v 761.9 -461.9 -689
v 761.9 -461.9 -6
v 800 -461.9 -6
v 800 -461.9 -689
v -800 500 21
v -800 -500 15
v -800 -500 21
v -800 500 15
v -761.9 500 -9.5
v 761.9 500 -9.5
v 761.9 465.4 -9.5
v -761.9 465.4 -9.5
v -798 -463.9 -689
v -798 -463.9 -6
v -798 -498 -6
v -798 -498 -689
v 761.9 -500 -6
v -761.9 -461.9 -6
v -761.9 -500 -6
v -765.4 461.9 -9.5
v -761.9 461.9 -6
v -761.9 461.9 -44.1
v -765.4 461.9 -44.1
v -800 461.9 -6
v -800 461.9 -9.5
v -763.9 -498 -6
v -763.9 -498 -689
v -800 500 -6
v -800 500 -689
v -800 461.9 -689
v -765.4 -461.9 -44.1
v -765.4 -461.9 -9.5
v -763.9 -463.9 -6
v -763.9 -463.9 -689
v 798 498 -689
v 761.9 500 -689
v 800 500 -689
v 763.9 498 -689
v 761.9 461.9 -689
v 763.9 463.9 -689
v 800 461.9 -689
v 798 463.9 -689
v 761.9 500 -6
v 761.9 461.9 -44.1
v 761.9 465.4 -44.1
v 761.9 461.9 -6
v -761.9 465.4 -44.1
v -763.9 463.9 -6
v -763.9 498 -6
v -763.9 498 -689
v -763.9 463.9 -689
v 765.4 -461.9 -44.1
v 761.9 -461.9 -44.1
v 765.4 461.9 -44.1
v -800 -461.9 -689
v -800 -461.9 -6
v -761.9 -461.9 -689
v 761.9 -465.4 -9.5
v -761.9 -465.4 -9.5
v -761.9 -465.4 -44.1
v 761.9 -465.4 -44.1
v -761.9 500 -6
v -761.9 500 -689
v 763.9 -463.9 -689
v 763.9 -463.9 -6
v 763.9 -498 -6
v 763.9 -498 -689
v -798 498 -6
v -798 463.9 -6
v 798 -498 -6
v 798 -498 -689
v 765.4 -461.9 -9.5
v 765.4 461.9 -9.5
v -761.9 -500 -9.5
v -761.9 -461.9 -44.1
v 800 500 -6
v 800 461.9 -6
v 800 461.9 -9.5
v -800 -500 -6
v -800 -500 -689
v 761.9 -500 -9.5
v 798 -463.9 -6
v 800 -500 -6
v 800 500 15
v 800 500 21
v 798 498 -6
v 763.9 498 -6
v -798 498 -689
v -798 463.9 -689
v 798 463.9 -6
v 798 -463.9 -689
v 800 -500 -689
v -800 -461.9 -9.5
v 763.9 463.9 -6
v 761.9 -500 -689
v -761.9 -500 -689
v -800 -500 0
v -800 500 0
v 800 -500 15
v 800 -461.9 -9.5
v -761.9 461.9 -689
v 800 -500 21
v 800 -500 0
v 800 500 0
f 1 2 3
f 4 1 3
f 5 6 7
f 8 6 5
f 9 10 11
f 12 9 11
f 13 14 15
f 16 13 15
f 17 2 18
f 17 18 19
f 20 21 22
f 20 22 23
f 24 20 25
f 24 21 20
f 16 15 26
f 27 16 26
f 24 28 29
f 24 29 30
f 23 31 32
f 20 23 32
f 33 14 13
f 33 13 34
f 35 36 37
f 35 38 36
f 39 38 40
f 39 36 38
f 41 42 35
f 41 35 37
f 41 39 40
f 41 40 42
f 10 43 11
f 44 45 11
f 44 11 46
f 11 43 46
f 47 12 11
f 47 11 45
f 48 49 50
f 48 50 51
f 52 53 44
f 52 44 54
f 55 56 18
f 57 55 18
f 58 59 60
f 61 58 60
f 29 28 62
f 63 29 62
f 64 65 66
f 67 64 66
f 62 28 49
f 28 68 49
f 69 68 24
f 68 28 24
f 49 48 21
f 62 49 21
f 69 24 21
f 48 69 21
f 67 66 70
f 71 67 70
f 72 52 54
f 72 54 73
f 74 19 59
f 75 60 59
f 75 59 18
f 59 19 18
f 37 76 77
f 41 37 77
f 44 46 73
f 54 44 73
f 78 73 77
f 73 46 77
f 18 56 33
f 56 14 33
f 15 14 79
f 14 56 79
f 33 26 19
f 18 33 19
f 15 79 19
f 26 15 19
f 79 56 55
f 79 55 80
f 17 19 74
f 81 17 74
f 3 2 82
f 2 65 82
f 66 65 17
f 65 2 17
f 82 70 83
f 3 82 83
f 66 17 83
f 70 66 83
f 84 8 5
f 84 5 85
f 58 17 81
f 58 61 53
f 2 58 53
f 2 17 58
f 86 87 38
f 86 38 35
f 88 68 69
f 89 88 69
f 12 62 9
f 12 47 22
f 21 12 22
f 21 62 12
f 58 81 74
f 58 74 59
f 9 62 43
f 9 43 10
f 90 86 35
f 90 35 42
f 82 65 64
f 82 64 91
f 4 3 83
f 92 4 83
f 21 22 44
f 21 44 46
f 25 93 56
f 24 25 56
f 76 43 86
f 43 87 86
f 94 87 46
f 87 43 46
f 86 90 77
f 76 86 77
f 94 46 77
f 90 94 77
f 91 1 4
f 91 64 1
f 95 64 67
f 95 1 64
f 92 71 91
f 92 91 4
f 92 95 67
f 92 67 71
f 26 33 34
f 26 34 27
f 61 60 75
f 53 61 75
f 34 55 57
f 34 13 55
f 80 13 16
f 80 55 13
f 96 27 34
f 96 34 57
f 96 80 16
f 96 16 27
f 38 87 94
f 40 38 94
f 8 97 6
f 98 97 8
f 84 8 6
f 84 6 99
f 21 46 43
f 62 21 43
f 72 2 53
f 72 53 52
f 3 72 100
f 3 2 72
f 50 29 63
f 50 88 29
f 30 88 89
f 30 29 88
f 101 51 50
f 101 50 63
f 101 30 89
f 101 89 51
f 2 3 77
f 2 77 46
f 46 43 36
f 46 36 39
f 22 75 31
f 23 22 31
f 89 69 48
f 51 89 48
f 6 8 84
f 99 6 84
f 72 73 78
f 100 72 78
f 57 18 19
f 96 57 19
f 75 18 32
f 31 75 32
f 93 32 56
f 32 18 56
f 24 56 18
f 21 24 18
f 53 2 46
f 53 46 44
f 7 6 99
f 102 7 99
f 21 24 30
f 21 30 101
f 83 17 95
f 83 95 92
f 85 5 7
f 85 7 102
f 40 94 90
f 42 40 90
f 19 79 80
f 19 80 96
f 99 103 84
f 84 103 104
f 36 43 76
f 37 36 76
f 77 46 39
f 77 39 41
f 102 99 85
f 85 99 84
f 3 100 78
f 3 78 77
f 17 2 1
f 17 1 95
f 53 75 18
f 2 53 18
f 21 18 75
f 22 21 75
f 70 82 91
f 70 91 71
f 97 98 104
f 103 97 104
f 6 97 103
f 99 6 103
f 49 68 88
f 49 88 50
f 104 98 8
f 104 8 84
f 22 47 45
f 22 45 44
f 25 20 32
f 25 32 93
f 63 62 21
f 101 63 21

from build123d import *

# Parameters (mm, degrees)
F0_W      = 1600
F0_H      = 1000
F1_DEPTH  = 15
F3_W      = 38.1
F3_H      = 38.1
F3_W_2    = 34.1
F3_H_2    = 34.1
F4_DEPTH  = 683
F6_DEPTH  = 1523.8
F9_DEPTH  = 923.8
F1_FACE_W = 1600
F1_FACE_H = 1000
F11_DEPTH = 6


with BuildPart() as f1:
    # F0 (on Top) → F1 (new body)
    with BuildSketch(Plane.XY):
        Rectangle(F0_W, F0_H)
    extrude(amount=F1_DEPTH)


with BuildPart() as f4:
    # F3 (on offset) → F4 (new body)
    with BuildSketch(Plane(origin=(0, 0, -6), x_dir=(1, 0, 0), z_dir=(0, 0, -1))):
        with Locations((-780.95, 480.95)):
            Rectangle(F3_W, F3_H)
        with Locations((-780.95, 480.95)):
            Rectangle(F3_W_2, F3_H_2, mode=Mode.SUBTRACT)
        with Locations((780.95, 480.95)):
            Rectangle(F3_W, F3_H)
        with Locations((780.95, 480.95)):
            Rectangle(F3_W_2, F3_H_2, mode=Mode.SUBTRACT)
        with Locations((-780.95, -480.95)):
            Rectangle(F3_W, F3_H)
        with Locations((-780.95, -480.95)):
            Rectangle(F3_W_2, F3_H_2, mode=Mode.SUBTRACT)
        with Locations((780.95, -480.95)):
            Rectangle(F3_W, F3_H)
        with Locations((780.95, -480.95)):
            Rectangle(F3_W_2, F3_H_2, mode=Mode.SUBTRACT)
    extrude(amount=F4_DEPTH)


with BuildPart() as f6:
    # F5 (on face) → F6 (new body, through all)
    with BuildSketch(Plane.YZ.offset(-761.9)):
        Polygon((-461.9, -6), (-500, -6), (-500, -9.5), (-465.4, -9.5), (-465.4, -44.1), (-461.9, -44.1), align=None)
    extrude(amount=F6_DEPTH)


with BuildPart() as f7_1:
    # F7: instance of F6
    add(f6.part.mirror(Plane.XZ))


with BuildPart() as f9:
    # F8 (on face) → F9 (new body, through all)
    with BuildSketch(Plane(origin=(0, -461.9, 0), x_dir=(-1, 0, 0), z_dir=(0, 1, 0))):
        Polygon((800, -9.5), (800, -6), (761.9, -6), (761.9, -44.1), (765.4, -44.1), (765.4, -9.5), align=None)
    extrude(amount=F9_DEPTH)


with BuildPart() as f10_1:
    # F10: instance of F9
    add(f9.part.mirror(Plane.YZ))


with BuildPart() as f11:
    # F1_face (on face) → F11 (new body)
    with BuildSketch(Plane.XY.offset(15)):
        Rectangle(F1_FACE_W, F1_FACE_H)
    extrude(amount=F11_DEPTH)


solid = Compound([f1.part, f4.part, f6.part, f7_1.part, f9.part, f10_1.part, f11.part])
